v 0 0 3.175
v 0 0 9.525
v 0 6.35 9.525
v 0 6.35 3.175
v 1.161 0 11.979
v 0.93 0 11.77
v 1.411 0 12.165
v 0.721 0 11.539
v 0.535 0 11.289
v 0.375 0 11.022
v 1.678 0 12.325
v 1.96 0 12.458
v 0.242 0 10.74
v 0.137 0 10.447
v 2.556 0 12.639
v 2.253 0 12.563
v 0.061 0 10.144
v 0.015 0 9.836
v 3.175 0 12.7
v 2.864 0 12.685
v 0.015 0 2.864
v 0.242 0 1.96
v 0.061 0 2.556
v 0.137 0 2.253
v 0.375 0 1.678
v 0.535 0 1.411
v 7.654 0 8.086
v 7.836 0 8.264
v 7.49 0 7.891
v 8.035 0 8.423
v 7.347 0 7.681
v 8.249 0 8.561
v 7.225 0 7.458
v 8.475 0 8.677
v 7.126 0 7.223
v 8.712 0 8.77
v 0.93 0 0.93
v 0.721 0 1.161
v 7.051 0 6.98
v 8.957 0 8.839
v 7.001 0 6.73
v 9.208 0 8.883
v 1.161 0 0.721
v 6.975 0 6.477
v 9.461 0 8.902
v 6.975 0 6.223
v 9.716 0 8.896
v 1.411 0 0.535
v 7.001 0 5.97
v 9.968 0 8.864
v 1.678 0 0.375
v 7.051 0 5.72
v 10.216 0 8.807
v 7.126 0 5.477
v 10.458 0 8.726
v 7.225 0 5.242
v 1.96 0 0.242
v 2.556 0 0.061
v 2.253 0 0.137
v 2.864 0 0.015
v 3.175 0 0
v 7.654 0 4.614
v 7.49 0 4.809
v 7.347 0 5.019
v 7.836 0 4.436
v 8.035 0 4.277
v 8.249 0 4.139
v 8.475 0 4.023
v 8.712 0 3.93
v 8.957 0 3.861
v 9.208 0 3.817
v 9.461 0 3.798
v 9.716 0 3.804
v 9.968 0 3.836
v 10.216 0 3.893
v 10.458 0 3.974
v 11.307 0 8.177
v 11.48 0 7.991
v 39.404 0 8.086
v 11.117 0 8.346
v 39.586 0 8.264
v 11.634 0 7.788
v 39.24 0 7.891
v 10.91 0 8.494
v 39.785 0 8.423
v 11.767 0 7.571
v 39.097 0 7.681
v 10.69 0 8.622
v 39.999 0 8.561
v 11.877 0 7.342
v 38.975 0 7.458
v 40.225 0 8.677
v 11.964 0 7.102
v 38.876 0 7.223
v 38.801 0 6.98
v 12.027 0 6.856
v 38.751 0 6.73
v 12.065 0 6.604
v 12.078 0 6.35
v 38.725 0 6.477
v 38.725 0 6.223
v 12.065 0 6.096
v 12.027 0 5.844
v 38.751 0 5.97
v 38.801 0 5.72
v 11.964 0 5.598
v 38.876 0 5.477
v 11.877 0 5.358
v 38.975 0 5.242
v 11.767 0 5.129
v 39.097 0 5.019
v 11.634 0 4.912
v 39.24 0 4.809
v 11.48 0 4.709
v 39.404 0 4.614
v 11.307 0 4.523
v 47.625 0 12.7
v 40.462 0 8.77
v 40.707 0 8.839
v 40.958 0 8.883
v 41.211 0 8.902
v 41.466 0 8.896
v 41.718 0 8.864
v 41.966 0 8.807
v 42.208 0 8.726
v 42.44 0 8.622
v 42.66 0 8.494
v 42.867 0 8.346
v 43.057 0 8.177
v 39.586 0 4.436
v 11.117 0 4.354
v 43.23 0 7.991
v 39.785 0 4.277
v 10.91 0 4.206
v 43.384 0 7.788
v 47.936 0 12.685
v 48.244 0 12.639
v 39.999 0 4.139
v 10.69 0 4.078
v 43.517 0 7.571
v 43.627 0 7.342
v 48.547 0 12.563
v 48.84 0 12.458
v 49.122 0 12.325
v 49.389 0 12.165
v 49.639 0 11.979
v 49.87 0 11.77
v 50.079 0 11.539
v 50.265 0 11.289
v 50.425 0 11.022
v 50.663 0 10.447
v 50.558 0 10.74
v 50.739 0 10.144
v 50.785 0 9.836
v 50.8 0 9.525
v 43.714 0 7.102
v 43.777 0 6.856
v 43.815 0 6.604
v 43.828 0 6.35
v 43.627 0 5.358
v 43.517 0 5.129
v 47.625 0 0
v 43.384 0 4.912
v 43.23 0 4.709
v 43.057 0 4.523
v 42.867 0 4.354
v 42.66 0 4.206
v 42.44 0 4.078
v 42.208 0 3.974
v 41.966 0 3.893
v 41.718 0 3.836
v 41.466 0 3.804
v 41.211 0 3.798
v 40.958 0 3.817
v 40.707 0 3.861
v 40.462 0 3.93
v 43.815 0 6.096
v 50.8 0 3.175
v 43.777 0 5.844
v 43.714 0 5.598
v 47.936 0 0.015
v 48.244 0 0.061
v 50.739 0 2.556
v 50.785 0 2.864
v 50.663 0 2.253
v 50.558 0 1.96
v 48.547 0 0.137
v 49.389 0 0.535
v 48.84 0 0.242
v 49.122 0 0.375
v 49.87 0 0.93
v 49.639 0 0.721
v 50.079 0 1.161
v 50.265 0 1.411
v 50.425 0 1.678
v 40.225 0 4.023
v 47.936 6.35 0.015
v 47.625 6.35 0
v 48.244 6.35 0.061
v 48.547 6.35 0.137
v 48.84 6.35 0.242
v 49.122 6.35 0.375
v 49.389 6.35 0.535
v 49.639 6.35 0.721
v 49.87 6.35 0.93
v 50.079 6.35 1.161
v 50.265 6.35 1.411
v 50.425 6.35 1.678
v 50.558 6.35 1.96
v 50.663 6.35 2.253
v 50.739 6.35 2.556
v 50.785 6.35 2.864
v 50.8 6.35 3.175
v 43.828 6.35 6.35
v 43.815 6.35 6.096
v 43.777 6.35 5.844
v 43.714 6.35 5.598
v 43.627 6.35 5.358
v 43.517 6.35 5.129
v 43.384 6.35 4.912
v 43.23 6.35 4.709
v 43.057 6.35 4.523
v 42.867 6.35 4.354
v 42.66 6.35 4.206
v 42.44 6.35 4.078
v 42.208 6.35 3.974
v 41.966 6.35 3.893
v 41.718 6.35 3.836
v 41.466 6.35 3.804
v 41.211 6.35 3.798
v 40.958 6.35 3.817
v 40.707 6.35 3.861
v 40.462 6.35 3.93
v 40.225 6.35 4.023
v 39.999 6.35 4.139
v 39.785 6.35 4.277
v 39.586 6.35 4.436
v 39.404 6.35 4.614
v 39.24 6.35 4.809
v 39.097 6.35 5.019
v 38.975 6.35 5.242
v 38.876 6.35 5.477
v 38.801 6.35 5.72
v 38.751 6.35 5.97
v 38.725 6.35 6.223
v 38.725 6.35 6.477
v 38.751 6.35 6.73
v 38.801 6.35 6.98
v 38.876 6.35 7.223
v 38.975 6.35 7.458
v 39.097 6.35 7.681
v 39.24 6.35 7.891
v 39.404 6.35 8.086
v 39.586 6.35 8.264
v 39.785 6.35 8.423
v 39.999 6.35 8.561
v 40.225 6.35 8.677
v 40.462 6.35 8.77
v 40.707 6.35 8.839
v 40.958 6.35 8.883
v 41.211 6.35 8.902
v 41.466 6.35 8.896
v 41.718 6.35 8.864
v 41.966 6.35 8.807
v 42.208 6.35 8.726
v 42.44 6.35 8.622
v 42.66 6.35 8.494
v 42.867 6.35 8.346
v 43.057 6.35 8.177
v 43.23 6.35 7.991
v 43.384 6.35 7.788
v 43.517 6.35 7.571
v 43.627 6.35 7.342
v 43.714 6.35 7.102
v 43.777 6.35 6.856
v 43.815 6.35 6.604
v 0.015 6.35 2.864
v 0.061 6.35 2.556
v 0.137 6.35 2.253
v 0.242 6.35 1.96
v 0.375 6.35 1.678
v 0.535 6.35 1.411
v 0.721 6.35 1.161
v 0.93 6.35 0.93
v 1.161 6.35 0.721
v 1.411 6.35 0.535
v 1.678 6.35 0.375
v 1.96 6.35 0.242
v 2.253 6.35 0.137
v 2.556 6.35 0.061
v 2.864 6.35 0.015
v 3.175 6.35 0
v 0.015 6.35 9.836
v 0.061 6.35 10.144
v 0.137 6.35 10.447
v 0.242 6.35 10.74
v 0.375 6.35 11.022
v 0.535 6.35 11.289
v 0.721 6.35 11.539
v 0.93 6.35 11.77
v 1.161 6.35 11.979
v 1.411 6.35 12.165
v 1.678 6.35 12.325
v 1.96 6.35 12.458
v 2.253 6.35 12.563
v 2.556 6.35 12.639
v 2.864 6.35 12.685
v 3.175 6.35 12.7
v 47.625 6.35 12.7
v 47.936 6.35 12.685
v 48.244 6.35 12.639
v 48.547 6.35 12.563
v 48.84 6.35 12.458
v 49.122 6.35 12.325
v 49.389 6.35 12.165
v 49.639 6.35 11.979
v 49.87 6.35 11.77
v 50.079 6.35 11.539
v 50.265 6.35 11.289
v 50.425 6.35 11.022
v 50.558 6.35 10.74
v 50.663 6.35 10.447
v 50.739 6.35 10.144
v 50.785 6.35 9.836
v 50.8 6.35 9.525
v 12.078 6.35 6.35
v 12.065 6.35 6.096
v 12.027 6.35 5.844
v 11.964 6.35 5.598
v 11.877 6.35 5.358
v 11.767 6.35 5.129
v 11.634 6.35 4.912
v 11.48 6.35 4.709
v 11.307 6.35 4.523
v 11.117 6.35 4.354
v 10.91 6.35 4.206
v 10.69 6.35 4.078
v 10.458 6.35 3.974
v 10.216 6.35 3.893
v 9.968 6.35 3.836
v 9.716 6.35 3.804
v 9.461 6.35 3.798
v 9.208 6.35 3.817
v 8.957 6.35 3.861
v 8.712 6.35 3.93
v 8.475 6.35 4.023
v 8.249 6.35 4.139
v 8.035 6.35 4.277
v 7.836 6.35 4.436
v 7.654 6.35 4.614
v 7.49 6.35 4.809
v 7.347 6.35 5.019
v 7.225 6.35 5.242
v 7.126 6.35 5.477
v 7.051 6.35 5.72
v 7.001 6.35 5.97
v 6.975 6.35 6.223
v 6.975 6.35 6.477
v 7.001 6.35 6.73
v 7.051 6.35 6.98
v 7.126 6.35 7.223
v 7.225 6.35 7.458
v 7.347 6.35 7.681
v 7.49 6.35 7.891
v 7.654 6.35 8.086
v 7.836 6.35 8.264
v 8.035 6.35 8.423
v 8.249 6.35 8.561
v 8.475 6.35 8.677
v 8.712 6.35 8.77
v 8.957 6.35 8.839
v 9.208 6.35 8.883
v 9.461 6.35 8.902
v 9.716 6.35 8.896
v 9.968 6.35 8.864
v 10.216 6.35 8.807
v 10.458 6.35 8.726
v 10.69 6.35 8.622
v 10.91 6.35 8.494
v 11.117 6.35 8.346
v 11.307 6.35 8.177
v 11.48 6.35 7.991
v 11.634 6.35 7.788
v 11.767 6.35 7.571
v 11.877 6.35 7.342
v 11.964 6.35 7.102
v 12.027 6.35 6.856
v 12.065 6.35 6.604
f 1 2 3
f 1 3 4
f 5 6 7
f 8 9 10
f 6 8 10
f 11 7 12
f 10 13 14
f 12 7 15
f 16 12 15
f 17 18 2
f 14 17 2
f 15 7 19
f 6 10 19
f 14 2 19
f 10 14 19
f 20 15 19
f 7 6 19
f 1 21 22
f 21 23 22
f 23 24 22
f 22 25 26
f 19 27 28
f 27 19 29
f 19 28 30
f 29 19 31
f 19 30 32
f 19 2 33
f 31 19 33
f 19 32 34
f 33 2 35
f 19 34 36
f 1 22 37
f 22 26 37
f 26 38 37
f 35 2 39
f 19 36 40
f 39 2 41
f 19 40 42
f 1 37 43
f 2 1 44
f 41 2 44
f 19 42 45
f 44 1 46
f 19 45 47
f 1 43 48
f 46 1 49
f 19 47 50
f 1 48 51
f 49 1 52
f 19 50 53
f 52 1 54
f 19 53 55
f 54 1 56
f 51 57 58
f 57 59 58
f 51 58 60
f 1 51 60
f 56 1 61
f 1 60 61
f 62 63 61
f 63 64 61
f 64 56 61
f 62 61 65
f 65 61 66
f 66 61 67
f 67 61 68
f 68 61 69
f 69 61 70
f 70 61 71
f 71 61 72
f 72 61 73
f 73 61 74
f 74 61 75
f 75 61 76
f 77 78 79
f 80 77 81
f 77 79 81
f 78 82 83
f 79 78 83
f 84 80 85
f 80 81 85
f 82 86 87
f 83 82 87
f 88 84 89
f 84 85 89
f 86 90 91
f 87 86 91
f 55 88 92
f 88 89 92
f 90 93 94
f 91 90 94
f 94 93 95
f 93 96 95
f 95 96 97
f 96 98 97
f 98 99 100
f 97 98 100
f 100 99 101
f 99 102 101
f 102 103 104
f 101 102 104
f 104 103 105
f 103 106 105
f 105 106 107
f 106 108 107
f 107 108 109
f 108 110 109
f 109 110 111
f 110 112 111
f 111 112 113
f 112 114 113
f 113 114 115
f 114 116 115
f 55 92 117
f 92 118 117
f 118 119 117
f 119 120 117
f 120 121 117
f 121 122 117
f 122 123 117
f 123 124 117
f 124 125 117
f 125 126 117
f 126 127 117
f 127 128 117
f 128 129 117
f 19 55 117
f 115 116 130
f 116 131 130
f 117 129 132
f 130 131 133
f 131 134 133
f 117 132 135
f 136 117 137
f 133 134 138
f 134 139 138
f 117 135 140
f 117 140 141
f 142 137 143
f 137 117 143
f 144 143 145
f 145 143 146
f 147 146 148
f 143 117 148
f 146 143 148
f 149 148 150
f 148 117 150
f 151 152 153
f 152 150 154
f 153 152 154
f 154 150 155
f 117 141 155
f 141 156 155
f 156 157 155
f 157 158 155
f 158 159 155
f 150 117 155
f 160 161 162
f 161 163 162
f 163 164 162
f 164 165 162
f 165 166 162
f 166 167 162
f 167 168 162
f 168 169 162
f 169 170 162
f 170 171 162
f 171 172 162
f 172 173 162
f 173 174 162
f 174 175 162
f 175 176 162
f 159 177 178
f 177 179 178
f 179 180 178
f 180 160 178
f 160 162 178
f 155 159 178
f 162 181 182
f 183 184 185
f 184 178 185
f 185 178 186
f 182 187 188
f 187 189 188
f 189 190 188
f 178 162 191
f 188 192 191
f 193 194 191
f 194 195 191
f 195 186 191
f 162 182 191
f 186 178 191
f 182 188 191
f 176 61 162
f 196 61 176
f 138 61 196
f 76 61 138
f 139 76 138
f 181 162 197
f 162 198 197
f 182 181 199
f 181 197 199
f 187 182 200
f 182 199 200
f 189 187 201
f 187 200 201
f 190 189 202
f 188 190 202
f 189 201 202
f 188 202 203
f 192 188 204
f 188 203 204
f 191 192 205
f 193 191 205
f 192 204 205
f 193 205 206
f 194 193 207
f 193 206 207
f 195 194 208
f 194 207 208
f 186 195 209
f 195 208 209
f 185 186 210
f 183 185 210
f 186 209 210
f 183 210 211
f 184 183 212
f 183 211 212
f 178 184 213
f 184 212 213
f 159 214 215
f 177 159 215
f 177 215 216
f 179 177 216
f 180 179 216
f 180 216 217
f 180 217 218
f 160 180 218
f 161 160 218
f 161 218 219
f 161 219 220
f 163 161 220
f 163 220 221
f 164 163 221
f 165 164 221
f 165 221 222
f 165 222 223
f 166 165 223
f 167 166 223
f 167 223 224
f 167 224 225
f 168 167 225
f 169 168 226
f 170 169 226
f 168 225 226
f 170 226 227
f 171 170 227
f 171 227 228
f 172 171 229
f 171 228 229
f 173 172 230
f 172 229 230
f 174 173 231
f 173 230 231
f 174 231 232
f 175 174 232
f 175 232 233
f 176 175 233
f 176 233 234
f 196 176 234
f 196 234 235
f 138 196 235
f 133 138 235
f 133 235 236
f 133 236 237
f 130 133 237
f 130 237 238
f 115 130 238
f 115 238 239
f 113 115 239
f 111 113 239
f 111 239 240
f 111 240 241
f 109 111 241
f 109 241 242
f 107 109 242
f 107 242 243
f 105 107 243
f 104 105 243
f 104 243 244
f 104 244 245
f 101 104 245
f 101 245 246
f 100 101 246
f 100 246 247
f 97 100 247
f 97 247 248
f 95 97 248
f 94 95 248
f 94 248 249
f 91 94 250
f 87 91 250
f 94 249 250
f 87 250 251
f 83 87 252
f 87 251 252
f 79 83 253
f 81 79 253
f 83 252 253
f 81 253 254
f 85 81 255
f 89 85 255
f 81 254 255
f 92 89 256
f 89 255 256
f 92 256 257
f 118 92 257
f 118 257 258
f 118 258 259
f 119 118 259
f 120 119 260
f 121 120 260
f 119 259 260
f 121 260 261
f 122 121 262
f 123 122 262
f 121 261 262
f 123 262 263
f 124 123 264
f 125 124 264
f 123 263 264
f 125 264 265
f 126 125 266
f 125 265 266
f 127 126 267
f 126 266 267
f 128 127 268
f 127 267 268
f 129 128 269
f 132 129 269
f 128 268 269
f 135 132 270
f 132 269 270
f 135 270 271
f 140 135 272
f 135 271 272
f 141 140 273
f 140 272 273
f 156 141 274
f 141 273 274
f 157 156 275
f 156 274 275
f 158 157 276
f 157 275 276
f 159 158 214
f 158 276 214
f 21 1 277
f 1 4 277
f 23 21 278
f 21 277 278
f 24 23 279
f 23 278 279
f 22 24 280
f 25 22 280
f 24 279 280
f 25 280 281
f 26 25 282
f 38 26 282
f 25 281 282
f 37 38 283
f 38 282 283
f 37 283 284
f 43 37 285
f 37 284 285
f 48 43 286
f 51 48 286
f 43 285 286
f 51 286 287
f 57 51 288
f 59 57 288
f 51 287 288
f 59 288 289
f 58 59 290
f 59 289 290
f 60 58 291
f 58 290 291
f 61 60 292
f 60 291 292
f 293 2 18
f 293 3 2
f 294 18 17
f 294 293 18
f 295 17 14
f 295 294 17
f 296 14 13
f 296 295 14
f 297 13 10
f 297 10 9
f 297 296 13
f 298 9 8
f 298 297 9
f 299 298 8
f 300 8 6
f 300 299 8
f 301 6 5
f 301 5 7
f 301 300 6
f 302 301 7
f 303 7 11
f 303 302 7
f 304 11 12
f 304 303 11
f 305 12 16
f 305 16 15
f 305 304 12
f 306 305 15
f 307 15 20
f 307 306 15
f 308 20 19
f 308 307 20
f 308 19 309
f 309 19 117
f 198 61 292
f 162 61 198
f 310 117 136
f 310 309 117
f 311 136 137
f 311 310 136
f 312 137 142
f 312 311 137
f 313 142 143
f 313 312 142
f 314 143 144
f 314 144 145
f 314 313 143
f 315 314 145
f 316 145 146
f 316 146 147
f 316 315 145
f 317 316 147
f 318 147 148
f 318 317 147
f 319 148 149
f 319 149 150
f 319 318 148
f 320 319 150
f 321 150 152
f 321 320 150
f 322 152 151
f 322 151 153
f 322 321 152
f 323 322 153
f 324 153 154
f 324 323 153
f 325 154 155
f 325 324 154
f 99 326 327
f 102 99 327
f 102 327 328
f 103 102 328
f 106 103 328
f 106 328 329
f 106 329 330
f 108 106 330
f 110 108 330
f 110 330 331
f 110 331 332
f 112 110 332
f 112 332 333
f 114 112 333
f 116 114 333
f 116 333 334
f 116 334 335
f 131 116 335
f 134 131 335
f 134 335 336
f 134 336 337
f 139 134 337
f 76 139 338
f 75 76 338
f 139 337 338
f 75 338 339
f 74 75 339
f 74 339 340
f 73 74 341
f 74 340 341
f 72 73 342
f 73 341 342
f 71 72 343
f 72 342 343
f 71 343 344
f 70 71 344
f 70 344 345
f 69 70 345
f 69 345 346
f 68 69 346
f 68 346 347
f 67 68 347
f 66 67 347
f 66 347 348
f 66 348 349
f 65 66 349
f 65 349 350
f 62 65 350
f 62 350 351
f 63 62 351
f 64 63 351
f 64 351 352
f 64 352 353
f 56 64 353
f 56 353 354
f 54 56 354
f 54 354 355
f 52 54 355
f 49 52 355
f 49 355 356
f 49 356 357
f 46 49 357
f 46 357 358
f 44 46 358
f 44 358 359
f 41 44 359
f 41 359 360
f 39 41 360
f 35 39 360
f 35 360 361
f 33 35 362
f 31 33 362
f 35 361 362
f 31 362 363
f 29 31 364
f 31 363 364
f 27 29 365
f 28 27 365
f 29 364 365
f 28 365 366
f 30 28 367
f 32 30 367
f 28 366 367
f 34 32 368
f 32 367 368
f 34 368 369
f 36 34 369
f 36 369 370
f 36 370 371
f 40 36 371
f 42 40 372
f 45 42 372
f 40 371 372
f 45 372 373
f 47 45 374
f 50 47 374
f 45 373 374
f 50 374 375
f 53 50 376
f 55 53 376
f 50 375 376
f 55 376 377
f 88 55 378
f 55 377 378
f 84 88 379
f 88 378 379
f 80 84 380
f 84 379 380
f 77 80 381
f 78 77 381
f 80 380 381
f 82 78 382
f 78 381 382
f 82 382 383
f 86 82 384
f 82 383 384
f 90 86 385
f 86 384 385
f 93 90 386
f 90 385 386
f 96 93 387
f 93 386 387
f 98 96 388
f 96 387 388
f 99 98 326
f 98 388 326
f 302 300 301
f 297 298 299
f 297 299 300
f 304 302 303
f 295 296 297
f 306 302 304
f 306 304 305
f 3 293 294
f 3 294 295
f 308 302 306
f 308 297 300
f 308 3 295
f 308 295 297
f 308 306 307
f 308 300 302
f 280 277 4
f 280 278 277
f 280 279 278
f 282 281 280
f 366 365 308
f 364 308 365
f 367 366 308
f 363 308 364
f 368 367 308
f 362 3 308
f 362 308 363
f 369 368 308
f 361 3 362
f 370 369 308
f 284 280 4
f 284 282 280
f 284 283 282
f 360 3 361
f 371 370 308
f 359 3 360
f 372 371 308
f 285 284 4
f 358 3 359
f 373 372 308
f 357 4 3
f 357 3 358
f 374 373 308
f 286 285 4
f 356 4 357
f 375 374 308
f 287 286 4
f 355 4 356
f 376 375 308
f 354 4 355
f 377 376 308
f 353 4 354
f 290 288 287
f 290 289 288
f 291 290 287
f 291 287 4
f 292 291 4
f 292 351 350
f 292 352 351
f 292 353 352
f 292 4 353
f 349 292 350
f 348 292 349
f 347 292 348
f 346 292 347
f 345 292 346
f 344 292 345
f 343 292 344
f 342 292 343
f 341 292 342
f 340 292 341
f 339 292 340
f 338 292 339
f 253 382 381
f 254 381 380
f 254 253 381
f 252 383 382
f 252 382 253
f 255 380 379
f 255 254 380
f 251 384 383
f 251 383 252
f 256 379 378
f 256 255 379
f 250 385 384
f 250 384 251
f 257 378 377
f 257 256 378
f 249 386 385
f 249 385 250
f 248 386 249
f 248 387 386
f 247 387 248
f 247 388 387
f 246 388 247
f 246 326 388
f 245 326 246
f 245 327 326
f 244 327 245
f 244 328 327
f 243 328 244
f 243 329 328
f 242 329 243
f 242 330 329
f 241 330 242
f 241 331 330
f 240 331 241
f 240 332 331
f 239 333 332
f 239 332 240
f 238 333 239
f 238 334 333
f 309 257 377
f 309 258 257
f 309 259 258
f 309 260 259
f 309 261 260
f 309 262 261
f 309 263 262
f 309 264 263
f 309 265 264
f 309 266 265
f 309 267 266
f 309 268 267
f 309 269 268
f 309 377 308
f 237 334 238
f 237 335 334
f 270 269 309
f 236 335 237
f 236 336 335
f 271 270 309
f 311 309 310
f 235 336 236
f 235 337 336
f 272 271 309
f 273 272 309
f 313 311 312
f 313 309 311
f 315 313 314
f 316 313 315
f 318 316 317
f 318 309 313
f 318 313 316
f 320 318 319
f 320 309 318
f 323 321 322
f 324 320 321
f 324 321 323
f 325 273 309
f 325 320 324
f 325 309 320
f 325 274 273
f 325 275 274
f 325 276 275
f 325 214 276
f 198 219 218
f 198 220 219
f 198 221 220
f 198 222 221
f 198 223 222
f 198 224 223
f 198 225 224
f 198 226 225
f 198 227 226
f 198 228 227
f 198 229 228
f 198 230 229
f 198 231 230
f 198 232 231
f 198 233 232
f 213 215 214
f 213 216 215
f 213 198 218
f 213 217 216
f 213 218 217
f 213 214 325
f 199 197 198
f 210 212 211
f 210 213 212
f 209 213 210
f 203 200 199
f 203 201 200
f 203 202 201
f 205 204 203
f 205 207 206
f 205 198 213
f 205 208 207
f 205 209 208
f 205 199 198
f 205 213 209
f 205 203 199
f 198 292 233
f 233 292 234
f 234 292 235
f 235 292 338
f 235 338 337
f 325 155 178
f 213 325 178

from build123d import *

# Parameters (mm, degrees)
SKETCH1_W                       = 50.8
SKETCH1_H                       = 12.7
BOSS_EXTRUDE1_DEPTH             = 6.35
TAP_DRILL_FOR_1_4_20_TAP1_D     = 5.1054
TAP_DRILL_FOR_1_4_20_TAP1_DEPTH = 6.35
FILLET1_R                       = 3.175


with BuildPart() as part:
    # Sketch1 → Boss-Extrude1 (new body)
    with BuildSketch(Plane(origin=(0, 0, 0), x_dir=(1, 0, 0), z_dir=(0, 1, 0))):
        with Locations((25.4, -6.35)):
            Rectangle(SKETCH1_W, SKETCH1_H)
    extrude(amount=BOSS_EXTRUDE1_DEPTH)

    # Tap Drill for 1/4-20 Tap1
    with Locations(Plane(origin=(0, 0, 0), x_dir=(-1, 0, 0), z_dir=(0, -1, 0))):
        with Locations((-9.525, -6.35), (-41.275, -6.35)):
            Hole(TAP_DRILL_FOR_1_4_20_TAP1_D / 2, depth=TAP_DRILL_FOR_1_4_20_TAP1_DEPTH)

    # Fillet1
    fillet1_edges = [part.edges().sort_by_distance(p)[0] for p in [
        (0, 3.175, 0),
        (50.8, 3.175, 0),
        (50.8, 3.175, 12.7),
        (0, 3.175, 12.7),
    ]]
    fillet(fillet1_edges, radius=FILLET1_R)


solid = part.part
